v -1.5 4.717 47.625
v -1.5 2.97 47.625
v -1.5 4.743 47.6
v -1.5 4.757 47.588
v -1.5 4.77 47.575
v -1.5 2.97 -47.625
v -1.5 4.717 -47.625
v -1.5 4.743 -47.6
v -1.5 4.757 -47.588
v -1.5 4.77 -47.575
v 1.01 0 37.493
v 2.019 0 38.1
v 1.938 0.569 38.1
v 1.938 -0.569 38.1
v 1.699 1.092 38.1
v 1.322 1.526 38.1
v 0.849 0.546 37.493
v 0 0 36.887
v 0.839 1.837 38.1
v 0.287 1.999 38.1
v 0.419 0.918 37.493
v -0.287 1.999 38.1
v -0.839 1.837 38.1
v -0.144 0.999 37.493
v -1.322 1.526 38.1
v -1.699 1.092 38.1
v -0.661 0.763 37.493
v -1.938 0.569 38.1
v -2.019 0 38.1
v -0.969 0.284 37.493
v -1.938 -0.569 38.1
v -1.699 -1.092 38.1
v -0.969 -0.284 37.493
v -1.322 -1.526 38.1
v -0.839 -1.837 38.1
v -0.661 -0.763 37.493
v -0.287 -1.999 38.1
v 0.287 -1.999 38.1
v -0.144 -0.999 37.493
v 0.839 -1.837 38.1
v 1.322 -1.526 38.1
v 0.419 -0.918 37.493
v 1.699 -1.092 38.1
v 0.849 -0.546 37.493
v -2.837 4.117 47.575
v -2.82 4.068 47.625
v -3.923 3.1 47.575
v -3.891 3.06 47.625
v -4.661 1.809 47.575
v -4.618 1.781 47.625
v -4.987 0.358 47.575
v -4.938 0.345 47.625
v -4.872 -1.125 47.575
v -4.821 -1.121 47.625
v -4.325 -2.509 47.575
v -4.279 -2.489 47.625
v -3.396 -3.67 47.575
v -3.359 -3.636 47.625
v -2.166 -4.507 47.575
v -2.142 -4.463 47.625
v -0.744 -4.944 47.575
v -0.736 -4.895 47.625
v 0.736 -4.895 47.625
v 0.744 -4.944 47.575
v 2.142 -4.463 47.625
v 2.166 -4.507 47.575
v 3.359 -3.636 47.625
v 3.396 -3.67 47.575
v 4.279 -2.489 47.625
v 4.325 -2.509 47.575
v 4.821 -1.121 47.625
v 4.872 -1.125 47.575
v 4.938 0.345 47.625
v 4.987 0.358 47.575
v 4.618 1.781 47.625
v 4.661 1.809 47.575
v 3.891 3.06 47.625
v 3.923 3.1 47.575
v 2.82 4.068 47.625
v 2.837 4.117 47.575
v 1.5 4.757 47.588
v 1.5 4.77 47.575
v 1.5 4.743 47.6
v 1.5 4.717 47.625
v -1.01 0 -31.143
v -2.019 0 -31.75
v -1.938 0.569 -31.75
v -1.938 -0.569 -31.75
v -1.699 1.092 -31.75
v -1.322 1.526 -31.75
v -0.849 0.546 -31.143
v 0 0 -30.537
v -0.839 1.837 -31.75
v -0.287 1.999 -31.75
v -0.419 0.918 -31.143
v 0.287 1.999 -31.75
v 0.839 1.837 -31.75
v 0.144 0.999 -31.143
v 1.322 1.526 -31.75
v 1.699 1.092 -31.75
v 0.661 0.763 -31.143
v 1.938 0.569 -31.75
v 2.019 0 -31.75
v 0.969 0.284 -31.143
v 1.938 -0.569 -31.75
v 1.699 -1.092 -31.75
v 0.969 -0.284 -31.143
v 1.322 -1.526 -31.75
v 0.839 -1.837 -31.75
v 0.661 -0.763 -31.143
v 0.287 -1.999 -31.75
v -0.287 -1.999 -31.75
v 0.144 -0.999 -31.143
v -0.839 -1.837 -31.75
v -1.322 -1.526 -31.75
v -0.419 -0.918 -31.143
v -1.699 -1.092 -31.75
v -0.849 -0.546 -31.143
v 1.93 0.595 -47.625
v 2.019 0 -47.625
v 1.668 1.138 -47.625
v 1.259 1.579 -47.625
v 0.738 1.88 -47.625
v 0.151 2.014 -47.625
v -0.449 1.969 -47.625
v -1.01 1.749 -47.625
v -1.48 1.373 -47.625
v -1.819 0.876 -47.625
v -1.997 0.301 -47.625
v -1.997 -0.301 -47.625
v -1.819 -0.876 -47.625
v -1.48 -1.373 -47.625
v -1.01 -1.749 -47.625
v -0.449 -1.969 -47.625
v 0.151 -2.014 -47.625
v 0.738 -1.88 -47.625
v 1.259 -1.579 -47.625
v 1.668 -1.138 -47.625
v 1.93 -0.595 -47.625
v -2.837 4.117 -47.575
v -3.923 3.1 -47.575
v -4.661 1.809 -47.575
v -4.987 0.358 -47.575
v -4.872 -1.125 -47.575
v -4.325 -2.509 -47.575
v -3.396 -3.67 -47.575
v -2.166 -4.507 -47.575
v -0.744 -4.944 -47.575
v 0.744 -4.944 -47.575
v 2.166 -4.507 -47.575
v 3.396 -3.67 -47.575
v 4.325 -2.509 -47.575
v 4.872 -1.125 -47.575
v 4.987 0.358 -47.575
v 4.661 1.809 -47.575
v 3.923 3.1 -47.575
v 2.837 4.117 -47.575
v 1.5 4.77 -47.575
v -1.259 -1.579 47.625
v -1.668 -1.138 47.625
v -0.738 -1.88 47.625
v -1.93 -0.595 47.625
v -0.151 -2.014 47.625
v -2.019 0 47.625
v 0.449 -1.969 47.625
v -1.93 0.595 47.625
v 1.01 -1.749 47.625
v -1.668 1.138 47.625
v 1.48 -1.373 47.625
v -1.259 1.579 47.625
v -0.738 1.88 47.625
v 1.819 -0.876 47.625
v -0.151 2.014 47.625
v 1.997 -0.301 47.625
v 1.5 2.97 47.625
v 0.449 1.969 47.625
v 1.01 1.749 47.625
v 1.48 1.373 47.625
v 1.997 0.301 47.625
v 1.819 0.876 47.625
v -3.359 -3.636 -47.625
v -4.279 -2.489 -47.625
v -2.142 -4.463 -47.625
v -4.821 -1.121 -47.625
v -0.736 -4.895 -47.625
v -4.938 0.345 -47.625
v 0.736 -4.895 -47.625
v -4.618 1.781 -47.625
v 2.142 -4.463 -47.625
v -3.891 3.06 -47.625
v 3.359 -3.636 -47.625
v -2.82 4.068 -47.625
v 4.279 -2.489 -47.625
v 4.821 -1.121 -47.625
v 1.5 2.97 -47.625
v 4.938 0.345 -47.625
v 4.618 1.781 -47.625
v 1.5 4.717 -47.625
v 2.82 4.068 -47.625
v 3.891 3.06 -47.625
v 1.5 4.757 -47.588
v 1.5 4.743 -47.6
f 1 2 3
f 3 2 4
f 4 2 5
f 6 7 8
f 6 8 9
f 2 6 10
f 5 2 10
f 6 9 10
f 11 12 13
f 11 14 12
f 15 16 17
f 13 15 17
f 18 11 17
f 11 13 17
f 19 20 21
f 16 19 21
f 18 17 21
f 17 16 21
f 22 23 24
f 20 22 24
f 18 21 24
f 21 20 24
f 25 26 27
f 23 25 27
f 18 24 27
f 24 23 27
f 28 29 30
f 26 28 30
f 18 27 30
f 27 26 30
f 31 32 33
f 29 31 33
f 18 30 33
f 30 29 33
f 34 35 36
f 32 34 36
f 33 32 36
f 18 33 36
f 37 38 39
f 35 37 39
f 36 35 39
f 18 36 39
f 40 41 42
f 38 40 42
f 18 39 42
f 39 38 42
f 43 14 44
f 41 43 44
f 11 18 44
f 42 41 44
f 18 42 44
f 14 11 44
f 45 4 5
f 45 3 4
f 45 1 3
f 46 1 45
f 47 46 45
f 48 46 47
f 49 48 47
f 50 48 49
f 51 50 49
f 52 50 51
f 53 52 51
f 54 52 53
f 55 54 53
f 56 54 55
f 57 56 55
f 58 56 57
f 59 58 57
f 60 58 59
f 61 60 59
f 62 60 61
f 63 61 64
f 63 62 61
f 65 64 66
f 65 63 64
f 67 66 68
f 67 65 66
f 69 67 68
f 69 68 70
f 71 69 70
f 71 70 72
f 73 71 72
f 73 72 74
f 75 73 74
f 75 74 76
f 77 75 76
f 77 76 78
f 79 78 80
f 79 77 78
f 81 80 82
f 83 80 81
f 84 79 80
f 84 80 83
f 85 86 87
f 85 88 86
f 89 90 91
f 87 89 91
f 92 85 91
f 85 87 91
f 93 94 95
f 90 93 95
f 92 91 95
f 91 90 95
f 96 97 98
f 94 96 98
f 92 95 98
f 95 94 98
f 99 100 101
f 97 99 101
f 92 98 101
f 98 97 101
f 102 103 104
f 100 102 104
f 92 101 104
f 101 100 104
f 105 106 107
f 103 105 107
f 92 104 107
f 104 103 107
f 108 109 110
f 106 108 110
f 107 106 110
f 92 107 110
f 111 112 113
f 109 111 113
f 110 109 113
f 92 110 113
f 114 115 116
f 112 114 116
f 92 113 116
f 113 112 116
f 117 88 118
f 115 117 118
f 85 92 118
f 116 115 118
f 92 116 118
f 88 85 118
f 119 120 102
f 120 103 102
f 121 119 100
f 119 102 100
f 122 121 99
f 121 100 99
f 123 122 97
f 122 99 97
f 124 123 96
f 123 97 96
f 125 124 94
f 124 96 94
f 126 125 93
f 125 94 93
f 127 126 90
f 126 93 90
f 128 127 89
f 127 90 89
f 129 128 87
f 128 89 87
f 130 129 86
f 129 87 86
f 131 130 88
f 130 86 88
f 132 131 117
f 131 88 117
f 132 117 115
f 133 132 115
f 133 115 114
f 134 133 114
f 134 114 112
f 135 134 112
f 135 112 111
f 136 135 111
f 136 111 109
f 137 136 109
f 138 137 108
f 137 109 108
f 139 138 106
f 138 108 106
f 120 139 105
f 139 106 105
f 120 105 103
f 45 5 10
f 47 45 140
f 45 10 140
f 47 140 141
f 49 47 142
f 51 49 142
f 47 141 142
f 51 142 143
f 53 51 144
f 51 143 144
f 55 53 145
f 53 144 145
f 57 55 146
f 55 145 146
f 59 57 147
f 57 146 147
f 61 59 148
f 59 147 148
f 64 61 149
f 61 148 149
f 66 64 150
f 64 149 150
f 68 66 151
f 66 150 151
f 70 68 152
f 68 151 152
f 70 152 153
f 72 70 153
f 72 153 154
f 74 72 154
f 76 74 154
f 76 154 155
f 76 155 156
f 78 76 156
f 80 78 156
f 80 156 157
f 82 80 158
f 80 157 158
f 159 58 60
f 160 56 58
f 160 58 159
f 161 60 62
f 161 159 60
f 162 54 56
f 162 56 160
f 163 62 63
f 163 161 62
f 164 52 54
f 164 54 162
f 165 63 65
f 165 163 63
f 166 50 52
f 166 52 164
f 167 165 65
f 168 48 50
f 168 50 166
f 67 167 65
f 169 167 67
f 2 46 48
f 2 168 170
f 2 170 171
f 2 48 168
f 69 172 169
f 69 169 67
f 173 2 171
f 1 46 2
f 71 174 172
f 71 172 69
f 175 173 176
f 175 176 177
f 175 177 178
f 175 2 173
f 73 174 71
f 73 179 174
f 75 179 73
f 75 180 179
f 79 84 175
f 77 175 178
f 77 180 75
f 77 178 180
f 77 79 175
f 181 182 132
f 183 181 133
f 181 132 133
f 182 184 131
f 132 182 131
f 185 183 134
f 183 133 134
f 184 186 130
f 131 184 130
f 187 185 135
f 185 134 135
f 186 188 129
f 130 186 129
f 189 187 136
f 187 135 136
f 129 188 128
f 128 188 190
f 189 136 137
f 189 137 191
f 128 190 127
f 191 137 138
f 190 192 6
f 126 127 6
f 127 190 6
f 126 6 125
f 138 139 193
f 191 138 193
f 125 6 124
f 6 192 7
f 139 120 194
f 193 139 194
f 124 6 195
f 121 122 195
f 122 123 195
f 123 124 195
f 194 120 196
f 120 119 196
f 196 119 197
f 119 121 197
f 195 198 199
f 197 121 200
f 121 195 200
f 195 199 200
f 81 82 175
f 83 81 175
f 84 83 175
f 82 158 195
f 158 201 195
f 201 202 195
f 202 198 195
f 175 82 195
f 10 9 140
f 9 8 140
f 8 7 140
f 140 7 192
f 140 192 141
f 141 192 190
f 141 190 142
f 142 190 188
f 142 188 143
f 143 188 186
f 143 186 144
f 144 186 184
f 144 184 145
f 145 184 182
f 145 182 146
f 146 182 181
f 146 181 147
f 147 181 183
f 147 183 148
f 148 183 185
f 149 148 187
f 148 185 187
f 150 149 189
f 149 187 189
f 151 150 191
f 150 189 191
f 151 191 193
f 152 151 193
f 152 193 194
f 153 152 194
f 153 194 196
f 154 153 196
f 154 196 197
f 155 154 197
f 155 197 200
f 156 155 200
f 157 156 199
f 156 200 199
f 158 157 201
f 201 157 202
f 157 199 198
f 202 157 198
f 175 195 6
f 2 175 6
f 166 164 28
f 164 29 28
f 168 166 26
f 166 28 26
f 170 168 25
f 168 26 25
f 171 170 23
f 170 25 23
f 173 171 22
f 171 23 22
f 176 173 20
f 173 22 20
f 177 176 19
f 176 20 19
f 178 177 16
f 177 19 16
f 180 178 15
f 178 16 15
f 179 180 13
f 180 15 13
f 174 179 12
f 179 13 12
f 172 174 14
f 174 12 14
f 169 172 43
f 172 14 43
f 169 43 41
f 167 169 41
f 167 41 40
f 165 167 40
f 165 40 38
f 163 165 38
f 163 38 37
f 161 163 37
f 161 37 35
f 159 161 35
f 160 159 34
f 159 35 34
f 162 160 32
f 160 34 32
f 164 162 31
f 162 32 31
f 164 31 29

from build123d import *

# Parameters (mm, degrees)
BOSS_EXTRUDE1_DEPTH            = 47.625
BOSS_EXTRUDE1_DEPTH_BACK       = 47.625
CHAMFER1_SIZE                  = 0.05
TAP_DRILL_FOR_10_32_TAP2_D     = 4.0386
TAP_DRILL_FOR_10_32_TAP2_DEPTH = 15.875
TAP_DRILL_FOR_10_32_TAP2_TIP   = 1.213317848
TAP_DRILL_FOR_10_32_TAP1_D     = 4.0386
TAP_DRILL_FOR_10_32_TAP1_DEPTH = 9.525
TAP_DRILL_FOR_10_32_TAP1_TIP   = 1.213317848


with BuildPart() as part:
    # Sketch3 → Boss-Extrude1 (new, two sides: drawn at the far end of the back side and taken through both)
    with BuildSketch(Plane.XY.offset(-BOSS_EXTRUDE1_DEPTH_BACK)):
        with BuildLine():
            Line((-1.5, 2.969696007), (-1.5, 4.769696007))
            ThreePointArc((-1.5, 4.769696007), (0, -5), (1.5, 4.769696007))
            Line((1.5, 4.769696007), (1.5, 2.969696007))
            Line((1.5, 2.969696007), (-1.5, 2.969696007))
        make_face()
    extrude(amount=BOSS_EXTRUDE1_DEPTH + BOSS_EXTRUDE1_DEPTH_BACK)

    # Chamfer1
    chamfer1_edges = [part.edges().sort_by_distance(p)[0] for p in [
        (0, -5, -47.625),
        (0, -5, 47.625),
    ]]
    chamfer(chamfer1_edges, length=CHAMFER1_SIZE)

    # Tap Drill for #10-32 Tap2
    with Locations(Plane(origin=(0, 0, -47.625), x_dir=(-1, 0, 0), z_dir=(0, 0, -1))):
        with Locations((0, 0)):
            Hole(TAP_DRILL_FOR_10_32_TAP2_D / 2, depth=TAP_DRILL_FOR_10_32_TAP2_DEPTH)
            with Locations((0, 0, -(TAP_DRILL_FOR_10_32_TAP2_DEPTH + TAP_DRILL_FOR_10_32_TAP2_TIP / 2))):  # 118° drill point
                Cone(0, TAP_DRILL_FOR_10_32_TAP2_D / 2, TAP_DRILL_FOR_10_32_TAP2_TIP, mode=Mode.SUBTRACT)

    # Tap Drill for #10-32 Tap1
    with Locations(Plane.XY.offset(47.625)):
        with Locations((0, 0)):
            Hole(TAP_DRILL_FOR_10_32_TAP1_D / 2, depth=TAP_DRILL_FOR_10_32_TAP1_DEPTH)
            with Locations((0, 0, -(TAP_DRILL_FOR_10_32_TAP1_DEPTH + TAP_DRILL_FOR_10_32_TAP1_TIP / 2))):  # 118° drill point
                Cone(0, TAP_DRILL_FOR_10_32_TAP1_D / 2, TAP_DRILL_FOR_10_32_TAP1_TIP, mode=Mode.SUBTRACT)


solid = part.part
